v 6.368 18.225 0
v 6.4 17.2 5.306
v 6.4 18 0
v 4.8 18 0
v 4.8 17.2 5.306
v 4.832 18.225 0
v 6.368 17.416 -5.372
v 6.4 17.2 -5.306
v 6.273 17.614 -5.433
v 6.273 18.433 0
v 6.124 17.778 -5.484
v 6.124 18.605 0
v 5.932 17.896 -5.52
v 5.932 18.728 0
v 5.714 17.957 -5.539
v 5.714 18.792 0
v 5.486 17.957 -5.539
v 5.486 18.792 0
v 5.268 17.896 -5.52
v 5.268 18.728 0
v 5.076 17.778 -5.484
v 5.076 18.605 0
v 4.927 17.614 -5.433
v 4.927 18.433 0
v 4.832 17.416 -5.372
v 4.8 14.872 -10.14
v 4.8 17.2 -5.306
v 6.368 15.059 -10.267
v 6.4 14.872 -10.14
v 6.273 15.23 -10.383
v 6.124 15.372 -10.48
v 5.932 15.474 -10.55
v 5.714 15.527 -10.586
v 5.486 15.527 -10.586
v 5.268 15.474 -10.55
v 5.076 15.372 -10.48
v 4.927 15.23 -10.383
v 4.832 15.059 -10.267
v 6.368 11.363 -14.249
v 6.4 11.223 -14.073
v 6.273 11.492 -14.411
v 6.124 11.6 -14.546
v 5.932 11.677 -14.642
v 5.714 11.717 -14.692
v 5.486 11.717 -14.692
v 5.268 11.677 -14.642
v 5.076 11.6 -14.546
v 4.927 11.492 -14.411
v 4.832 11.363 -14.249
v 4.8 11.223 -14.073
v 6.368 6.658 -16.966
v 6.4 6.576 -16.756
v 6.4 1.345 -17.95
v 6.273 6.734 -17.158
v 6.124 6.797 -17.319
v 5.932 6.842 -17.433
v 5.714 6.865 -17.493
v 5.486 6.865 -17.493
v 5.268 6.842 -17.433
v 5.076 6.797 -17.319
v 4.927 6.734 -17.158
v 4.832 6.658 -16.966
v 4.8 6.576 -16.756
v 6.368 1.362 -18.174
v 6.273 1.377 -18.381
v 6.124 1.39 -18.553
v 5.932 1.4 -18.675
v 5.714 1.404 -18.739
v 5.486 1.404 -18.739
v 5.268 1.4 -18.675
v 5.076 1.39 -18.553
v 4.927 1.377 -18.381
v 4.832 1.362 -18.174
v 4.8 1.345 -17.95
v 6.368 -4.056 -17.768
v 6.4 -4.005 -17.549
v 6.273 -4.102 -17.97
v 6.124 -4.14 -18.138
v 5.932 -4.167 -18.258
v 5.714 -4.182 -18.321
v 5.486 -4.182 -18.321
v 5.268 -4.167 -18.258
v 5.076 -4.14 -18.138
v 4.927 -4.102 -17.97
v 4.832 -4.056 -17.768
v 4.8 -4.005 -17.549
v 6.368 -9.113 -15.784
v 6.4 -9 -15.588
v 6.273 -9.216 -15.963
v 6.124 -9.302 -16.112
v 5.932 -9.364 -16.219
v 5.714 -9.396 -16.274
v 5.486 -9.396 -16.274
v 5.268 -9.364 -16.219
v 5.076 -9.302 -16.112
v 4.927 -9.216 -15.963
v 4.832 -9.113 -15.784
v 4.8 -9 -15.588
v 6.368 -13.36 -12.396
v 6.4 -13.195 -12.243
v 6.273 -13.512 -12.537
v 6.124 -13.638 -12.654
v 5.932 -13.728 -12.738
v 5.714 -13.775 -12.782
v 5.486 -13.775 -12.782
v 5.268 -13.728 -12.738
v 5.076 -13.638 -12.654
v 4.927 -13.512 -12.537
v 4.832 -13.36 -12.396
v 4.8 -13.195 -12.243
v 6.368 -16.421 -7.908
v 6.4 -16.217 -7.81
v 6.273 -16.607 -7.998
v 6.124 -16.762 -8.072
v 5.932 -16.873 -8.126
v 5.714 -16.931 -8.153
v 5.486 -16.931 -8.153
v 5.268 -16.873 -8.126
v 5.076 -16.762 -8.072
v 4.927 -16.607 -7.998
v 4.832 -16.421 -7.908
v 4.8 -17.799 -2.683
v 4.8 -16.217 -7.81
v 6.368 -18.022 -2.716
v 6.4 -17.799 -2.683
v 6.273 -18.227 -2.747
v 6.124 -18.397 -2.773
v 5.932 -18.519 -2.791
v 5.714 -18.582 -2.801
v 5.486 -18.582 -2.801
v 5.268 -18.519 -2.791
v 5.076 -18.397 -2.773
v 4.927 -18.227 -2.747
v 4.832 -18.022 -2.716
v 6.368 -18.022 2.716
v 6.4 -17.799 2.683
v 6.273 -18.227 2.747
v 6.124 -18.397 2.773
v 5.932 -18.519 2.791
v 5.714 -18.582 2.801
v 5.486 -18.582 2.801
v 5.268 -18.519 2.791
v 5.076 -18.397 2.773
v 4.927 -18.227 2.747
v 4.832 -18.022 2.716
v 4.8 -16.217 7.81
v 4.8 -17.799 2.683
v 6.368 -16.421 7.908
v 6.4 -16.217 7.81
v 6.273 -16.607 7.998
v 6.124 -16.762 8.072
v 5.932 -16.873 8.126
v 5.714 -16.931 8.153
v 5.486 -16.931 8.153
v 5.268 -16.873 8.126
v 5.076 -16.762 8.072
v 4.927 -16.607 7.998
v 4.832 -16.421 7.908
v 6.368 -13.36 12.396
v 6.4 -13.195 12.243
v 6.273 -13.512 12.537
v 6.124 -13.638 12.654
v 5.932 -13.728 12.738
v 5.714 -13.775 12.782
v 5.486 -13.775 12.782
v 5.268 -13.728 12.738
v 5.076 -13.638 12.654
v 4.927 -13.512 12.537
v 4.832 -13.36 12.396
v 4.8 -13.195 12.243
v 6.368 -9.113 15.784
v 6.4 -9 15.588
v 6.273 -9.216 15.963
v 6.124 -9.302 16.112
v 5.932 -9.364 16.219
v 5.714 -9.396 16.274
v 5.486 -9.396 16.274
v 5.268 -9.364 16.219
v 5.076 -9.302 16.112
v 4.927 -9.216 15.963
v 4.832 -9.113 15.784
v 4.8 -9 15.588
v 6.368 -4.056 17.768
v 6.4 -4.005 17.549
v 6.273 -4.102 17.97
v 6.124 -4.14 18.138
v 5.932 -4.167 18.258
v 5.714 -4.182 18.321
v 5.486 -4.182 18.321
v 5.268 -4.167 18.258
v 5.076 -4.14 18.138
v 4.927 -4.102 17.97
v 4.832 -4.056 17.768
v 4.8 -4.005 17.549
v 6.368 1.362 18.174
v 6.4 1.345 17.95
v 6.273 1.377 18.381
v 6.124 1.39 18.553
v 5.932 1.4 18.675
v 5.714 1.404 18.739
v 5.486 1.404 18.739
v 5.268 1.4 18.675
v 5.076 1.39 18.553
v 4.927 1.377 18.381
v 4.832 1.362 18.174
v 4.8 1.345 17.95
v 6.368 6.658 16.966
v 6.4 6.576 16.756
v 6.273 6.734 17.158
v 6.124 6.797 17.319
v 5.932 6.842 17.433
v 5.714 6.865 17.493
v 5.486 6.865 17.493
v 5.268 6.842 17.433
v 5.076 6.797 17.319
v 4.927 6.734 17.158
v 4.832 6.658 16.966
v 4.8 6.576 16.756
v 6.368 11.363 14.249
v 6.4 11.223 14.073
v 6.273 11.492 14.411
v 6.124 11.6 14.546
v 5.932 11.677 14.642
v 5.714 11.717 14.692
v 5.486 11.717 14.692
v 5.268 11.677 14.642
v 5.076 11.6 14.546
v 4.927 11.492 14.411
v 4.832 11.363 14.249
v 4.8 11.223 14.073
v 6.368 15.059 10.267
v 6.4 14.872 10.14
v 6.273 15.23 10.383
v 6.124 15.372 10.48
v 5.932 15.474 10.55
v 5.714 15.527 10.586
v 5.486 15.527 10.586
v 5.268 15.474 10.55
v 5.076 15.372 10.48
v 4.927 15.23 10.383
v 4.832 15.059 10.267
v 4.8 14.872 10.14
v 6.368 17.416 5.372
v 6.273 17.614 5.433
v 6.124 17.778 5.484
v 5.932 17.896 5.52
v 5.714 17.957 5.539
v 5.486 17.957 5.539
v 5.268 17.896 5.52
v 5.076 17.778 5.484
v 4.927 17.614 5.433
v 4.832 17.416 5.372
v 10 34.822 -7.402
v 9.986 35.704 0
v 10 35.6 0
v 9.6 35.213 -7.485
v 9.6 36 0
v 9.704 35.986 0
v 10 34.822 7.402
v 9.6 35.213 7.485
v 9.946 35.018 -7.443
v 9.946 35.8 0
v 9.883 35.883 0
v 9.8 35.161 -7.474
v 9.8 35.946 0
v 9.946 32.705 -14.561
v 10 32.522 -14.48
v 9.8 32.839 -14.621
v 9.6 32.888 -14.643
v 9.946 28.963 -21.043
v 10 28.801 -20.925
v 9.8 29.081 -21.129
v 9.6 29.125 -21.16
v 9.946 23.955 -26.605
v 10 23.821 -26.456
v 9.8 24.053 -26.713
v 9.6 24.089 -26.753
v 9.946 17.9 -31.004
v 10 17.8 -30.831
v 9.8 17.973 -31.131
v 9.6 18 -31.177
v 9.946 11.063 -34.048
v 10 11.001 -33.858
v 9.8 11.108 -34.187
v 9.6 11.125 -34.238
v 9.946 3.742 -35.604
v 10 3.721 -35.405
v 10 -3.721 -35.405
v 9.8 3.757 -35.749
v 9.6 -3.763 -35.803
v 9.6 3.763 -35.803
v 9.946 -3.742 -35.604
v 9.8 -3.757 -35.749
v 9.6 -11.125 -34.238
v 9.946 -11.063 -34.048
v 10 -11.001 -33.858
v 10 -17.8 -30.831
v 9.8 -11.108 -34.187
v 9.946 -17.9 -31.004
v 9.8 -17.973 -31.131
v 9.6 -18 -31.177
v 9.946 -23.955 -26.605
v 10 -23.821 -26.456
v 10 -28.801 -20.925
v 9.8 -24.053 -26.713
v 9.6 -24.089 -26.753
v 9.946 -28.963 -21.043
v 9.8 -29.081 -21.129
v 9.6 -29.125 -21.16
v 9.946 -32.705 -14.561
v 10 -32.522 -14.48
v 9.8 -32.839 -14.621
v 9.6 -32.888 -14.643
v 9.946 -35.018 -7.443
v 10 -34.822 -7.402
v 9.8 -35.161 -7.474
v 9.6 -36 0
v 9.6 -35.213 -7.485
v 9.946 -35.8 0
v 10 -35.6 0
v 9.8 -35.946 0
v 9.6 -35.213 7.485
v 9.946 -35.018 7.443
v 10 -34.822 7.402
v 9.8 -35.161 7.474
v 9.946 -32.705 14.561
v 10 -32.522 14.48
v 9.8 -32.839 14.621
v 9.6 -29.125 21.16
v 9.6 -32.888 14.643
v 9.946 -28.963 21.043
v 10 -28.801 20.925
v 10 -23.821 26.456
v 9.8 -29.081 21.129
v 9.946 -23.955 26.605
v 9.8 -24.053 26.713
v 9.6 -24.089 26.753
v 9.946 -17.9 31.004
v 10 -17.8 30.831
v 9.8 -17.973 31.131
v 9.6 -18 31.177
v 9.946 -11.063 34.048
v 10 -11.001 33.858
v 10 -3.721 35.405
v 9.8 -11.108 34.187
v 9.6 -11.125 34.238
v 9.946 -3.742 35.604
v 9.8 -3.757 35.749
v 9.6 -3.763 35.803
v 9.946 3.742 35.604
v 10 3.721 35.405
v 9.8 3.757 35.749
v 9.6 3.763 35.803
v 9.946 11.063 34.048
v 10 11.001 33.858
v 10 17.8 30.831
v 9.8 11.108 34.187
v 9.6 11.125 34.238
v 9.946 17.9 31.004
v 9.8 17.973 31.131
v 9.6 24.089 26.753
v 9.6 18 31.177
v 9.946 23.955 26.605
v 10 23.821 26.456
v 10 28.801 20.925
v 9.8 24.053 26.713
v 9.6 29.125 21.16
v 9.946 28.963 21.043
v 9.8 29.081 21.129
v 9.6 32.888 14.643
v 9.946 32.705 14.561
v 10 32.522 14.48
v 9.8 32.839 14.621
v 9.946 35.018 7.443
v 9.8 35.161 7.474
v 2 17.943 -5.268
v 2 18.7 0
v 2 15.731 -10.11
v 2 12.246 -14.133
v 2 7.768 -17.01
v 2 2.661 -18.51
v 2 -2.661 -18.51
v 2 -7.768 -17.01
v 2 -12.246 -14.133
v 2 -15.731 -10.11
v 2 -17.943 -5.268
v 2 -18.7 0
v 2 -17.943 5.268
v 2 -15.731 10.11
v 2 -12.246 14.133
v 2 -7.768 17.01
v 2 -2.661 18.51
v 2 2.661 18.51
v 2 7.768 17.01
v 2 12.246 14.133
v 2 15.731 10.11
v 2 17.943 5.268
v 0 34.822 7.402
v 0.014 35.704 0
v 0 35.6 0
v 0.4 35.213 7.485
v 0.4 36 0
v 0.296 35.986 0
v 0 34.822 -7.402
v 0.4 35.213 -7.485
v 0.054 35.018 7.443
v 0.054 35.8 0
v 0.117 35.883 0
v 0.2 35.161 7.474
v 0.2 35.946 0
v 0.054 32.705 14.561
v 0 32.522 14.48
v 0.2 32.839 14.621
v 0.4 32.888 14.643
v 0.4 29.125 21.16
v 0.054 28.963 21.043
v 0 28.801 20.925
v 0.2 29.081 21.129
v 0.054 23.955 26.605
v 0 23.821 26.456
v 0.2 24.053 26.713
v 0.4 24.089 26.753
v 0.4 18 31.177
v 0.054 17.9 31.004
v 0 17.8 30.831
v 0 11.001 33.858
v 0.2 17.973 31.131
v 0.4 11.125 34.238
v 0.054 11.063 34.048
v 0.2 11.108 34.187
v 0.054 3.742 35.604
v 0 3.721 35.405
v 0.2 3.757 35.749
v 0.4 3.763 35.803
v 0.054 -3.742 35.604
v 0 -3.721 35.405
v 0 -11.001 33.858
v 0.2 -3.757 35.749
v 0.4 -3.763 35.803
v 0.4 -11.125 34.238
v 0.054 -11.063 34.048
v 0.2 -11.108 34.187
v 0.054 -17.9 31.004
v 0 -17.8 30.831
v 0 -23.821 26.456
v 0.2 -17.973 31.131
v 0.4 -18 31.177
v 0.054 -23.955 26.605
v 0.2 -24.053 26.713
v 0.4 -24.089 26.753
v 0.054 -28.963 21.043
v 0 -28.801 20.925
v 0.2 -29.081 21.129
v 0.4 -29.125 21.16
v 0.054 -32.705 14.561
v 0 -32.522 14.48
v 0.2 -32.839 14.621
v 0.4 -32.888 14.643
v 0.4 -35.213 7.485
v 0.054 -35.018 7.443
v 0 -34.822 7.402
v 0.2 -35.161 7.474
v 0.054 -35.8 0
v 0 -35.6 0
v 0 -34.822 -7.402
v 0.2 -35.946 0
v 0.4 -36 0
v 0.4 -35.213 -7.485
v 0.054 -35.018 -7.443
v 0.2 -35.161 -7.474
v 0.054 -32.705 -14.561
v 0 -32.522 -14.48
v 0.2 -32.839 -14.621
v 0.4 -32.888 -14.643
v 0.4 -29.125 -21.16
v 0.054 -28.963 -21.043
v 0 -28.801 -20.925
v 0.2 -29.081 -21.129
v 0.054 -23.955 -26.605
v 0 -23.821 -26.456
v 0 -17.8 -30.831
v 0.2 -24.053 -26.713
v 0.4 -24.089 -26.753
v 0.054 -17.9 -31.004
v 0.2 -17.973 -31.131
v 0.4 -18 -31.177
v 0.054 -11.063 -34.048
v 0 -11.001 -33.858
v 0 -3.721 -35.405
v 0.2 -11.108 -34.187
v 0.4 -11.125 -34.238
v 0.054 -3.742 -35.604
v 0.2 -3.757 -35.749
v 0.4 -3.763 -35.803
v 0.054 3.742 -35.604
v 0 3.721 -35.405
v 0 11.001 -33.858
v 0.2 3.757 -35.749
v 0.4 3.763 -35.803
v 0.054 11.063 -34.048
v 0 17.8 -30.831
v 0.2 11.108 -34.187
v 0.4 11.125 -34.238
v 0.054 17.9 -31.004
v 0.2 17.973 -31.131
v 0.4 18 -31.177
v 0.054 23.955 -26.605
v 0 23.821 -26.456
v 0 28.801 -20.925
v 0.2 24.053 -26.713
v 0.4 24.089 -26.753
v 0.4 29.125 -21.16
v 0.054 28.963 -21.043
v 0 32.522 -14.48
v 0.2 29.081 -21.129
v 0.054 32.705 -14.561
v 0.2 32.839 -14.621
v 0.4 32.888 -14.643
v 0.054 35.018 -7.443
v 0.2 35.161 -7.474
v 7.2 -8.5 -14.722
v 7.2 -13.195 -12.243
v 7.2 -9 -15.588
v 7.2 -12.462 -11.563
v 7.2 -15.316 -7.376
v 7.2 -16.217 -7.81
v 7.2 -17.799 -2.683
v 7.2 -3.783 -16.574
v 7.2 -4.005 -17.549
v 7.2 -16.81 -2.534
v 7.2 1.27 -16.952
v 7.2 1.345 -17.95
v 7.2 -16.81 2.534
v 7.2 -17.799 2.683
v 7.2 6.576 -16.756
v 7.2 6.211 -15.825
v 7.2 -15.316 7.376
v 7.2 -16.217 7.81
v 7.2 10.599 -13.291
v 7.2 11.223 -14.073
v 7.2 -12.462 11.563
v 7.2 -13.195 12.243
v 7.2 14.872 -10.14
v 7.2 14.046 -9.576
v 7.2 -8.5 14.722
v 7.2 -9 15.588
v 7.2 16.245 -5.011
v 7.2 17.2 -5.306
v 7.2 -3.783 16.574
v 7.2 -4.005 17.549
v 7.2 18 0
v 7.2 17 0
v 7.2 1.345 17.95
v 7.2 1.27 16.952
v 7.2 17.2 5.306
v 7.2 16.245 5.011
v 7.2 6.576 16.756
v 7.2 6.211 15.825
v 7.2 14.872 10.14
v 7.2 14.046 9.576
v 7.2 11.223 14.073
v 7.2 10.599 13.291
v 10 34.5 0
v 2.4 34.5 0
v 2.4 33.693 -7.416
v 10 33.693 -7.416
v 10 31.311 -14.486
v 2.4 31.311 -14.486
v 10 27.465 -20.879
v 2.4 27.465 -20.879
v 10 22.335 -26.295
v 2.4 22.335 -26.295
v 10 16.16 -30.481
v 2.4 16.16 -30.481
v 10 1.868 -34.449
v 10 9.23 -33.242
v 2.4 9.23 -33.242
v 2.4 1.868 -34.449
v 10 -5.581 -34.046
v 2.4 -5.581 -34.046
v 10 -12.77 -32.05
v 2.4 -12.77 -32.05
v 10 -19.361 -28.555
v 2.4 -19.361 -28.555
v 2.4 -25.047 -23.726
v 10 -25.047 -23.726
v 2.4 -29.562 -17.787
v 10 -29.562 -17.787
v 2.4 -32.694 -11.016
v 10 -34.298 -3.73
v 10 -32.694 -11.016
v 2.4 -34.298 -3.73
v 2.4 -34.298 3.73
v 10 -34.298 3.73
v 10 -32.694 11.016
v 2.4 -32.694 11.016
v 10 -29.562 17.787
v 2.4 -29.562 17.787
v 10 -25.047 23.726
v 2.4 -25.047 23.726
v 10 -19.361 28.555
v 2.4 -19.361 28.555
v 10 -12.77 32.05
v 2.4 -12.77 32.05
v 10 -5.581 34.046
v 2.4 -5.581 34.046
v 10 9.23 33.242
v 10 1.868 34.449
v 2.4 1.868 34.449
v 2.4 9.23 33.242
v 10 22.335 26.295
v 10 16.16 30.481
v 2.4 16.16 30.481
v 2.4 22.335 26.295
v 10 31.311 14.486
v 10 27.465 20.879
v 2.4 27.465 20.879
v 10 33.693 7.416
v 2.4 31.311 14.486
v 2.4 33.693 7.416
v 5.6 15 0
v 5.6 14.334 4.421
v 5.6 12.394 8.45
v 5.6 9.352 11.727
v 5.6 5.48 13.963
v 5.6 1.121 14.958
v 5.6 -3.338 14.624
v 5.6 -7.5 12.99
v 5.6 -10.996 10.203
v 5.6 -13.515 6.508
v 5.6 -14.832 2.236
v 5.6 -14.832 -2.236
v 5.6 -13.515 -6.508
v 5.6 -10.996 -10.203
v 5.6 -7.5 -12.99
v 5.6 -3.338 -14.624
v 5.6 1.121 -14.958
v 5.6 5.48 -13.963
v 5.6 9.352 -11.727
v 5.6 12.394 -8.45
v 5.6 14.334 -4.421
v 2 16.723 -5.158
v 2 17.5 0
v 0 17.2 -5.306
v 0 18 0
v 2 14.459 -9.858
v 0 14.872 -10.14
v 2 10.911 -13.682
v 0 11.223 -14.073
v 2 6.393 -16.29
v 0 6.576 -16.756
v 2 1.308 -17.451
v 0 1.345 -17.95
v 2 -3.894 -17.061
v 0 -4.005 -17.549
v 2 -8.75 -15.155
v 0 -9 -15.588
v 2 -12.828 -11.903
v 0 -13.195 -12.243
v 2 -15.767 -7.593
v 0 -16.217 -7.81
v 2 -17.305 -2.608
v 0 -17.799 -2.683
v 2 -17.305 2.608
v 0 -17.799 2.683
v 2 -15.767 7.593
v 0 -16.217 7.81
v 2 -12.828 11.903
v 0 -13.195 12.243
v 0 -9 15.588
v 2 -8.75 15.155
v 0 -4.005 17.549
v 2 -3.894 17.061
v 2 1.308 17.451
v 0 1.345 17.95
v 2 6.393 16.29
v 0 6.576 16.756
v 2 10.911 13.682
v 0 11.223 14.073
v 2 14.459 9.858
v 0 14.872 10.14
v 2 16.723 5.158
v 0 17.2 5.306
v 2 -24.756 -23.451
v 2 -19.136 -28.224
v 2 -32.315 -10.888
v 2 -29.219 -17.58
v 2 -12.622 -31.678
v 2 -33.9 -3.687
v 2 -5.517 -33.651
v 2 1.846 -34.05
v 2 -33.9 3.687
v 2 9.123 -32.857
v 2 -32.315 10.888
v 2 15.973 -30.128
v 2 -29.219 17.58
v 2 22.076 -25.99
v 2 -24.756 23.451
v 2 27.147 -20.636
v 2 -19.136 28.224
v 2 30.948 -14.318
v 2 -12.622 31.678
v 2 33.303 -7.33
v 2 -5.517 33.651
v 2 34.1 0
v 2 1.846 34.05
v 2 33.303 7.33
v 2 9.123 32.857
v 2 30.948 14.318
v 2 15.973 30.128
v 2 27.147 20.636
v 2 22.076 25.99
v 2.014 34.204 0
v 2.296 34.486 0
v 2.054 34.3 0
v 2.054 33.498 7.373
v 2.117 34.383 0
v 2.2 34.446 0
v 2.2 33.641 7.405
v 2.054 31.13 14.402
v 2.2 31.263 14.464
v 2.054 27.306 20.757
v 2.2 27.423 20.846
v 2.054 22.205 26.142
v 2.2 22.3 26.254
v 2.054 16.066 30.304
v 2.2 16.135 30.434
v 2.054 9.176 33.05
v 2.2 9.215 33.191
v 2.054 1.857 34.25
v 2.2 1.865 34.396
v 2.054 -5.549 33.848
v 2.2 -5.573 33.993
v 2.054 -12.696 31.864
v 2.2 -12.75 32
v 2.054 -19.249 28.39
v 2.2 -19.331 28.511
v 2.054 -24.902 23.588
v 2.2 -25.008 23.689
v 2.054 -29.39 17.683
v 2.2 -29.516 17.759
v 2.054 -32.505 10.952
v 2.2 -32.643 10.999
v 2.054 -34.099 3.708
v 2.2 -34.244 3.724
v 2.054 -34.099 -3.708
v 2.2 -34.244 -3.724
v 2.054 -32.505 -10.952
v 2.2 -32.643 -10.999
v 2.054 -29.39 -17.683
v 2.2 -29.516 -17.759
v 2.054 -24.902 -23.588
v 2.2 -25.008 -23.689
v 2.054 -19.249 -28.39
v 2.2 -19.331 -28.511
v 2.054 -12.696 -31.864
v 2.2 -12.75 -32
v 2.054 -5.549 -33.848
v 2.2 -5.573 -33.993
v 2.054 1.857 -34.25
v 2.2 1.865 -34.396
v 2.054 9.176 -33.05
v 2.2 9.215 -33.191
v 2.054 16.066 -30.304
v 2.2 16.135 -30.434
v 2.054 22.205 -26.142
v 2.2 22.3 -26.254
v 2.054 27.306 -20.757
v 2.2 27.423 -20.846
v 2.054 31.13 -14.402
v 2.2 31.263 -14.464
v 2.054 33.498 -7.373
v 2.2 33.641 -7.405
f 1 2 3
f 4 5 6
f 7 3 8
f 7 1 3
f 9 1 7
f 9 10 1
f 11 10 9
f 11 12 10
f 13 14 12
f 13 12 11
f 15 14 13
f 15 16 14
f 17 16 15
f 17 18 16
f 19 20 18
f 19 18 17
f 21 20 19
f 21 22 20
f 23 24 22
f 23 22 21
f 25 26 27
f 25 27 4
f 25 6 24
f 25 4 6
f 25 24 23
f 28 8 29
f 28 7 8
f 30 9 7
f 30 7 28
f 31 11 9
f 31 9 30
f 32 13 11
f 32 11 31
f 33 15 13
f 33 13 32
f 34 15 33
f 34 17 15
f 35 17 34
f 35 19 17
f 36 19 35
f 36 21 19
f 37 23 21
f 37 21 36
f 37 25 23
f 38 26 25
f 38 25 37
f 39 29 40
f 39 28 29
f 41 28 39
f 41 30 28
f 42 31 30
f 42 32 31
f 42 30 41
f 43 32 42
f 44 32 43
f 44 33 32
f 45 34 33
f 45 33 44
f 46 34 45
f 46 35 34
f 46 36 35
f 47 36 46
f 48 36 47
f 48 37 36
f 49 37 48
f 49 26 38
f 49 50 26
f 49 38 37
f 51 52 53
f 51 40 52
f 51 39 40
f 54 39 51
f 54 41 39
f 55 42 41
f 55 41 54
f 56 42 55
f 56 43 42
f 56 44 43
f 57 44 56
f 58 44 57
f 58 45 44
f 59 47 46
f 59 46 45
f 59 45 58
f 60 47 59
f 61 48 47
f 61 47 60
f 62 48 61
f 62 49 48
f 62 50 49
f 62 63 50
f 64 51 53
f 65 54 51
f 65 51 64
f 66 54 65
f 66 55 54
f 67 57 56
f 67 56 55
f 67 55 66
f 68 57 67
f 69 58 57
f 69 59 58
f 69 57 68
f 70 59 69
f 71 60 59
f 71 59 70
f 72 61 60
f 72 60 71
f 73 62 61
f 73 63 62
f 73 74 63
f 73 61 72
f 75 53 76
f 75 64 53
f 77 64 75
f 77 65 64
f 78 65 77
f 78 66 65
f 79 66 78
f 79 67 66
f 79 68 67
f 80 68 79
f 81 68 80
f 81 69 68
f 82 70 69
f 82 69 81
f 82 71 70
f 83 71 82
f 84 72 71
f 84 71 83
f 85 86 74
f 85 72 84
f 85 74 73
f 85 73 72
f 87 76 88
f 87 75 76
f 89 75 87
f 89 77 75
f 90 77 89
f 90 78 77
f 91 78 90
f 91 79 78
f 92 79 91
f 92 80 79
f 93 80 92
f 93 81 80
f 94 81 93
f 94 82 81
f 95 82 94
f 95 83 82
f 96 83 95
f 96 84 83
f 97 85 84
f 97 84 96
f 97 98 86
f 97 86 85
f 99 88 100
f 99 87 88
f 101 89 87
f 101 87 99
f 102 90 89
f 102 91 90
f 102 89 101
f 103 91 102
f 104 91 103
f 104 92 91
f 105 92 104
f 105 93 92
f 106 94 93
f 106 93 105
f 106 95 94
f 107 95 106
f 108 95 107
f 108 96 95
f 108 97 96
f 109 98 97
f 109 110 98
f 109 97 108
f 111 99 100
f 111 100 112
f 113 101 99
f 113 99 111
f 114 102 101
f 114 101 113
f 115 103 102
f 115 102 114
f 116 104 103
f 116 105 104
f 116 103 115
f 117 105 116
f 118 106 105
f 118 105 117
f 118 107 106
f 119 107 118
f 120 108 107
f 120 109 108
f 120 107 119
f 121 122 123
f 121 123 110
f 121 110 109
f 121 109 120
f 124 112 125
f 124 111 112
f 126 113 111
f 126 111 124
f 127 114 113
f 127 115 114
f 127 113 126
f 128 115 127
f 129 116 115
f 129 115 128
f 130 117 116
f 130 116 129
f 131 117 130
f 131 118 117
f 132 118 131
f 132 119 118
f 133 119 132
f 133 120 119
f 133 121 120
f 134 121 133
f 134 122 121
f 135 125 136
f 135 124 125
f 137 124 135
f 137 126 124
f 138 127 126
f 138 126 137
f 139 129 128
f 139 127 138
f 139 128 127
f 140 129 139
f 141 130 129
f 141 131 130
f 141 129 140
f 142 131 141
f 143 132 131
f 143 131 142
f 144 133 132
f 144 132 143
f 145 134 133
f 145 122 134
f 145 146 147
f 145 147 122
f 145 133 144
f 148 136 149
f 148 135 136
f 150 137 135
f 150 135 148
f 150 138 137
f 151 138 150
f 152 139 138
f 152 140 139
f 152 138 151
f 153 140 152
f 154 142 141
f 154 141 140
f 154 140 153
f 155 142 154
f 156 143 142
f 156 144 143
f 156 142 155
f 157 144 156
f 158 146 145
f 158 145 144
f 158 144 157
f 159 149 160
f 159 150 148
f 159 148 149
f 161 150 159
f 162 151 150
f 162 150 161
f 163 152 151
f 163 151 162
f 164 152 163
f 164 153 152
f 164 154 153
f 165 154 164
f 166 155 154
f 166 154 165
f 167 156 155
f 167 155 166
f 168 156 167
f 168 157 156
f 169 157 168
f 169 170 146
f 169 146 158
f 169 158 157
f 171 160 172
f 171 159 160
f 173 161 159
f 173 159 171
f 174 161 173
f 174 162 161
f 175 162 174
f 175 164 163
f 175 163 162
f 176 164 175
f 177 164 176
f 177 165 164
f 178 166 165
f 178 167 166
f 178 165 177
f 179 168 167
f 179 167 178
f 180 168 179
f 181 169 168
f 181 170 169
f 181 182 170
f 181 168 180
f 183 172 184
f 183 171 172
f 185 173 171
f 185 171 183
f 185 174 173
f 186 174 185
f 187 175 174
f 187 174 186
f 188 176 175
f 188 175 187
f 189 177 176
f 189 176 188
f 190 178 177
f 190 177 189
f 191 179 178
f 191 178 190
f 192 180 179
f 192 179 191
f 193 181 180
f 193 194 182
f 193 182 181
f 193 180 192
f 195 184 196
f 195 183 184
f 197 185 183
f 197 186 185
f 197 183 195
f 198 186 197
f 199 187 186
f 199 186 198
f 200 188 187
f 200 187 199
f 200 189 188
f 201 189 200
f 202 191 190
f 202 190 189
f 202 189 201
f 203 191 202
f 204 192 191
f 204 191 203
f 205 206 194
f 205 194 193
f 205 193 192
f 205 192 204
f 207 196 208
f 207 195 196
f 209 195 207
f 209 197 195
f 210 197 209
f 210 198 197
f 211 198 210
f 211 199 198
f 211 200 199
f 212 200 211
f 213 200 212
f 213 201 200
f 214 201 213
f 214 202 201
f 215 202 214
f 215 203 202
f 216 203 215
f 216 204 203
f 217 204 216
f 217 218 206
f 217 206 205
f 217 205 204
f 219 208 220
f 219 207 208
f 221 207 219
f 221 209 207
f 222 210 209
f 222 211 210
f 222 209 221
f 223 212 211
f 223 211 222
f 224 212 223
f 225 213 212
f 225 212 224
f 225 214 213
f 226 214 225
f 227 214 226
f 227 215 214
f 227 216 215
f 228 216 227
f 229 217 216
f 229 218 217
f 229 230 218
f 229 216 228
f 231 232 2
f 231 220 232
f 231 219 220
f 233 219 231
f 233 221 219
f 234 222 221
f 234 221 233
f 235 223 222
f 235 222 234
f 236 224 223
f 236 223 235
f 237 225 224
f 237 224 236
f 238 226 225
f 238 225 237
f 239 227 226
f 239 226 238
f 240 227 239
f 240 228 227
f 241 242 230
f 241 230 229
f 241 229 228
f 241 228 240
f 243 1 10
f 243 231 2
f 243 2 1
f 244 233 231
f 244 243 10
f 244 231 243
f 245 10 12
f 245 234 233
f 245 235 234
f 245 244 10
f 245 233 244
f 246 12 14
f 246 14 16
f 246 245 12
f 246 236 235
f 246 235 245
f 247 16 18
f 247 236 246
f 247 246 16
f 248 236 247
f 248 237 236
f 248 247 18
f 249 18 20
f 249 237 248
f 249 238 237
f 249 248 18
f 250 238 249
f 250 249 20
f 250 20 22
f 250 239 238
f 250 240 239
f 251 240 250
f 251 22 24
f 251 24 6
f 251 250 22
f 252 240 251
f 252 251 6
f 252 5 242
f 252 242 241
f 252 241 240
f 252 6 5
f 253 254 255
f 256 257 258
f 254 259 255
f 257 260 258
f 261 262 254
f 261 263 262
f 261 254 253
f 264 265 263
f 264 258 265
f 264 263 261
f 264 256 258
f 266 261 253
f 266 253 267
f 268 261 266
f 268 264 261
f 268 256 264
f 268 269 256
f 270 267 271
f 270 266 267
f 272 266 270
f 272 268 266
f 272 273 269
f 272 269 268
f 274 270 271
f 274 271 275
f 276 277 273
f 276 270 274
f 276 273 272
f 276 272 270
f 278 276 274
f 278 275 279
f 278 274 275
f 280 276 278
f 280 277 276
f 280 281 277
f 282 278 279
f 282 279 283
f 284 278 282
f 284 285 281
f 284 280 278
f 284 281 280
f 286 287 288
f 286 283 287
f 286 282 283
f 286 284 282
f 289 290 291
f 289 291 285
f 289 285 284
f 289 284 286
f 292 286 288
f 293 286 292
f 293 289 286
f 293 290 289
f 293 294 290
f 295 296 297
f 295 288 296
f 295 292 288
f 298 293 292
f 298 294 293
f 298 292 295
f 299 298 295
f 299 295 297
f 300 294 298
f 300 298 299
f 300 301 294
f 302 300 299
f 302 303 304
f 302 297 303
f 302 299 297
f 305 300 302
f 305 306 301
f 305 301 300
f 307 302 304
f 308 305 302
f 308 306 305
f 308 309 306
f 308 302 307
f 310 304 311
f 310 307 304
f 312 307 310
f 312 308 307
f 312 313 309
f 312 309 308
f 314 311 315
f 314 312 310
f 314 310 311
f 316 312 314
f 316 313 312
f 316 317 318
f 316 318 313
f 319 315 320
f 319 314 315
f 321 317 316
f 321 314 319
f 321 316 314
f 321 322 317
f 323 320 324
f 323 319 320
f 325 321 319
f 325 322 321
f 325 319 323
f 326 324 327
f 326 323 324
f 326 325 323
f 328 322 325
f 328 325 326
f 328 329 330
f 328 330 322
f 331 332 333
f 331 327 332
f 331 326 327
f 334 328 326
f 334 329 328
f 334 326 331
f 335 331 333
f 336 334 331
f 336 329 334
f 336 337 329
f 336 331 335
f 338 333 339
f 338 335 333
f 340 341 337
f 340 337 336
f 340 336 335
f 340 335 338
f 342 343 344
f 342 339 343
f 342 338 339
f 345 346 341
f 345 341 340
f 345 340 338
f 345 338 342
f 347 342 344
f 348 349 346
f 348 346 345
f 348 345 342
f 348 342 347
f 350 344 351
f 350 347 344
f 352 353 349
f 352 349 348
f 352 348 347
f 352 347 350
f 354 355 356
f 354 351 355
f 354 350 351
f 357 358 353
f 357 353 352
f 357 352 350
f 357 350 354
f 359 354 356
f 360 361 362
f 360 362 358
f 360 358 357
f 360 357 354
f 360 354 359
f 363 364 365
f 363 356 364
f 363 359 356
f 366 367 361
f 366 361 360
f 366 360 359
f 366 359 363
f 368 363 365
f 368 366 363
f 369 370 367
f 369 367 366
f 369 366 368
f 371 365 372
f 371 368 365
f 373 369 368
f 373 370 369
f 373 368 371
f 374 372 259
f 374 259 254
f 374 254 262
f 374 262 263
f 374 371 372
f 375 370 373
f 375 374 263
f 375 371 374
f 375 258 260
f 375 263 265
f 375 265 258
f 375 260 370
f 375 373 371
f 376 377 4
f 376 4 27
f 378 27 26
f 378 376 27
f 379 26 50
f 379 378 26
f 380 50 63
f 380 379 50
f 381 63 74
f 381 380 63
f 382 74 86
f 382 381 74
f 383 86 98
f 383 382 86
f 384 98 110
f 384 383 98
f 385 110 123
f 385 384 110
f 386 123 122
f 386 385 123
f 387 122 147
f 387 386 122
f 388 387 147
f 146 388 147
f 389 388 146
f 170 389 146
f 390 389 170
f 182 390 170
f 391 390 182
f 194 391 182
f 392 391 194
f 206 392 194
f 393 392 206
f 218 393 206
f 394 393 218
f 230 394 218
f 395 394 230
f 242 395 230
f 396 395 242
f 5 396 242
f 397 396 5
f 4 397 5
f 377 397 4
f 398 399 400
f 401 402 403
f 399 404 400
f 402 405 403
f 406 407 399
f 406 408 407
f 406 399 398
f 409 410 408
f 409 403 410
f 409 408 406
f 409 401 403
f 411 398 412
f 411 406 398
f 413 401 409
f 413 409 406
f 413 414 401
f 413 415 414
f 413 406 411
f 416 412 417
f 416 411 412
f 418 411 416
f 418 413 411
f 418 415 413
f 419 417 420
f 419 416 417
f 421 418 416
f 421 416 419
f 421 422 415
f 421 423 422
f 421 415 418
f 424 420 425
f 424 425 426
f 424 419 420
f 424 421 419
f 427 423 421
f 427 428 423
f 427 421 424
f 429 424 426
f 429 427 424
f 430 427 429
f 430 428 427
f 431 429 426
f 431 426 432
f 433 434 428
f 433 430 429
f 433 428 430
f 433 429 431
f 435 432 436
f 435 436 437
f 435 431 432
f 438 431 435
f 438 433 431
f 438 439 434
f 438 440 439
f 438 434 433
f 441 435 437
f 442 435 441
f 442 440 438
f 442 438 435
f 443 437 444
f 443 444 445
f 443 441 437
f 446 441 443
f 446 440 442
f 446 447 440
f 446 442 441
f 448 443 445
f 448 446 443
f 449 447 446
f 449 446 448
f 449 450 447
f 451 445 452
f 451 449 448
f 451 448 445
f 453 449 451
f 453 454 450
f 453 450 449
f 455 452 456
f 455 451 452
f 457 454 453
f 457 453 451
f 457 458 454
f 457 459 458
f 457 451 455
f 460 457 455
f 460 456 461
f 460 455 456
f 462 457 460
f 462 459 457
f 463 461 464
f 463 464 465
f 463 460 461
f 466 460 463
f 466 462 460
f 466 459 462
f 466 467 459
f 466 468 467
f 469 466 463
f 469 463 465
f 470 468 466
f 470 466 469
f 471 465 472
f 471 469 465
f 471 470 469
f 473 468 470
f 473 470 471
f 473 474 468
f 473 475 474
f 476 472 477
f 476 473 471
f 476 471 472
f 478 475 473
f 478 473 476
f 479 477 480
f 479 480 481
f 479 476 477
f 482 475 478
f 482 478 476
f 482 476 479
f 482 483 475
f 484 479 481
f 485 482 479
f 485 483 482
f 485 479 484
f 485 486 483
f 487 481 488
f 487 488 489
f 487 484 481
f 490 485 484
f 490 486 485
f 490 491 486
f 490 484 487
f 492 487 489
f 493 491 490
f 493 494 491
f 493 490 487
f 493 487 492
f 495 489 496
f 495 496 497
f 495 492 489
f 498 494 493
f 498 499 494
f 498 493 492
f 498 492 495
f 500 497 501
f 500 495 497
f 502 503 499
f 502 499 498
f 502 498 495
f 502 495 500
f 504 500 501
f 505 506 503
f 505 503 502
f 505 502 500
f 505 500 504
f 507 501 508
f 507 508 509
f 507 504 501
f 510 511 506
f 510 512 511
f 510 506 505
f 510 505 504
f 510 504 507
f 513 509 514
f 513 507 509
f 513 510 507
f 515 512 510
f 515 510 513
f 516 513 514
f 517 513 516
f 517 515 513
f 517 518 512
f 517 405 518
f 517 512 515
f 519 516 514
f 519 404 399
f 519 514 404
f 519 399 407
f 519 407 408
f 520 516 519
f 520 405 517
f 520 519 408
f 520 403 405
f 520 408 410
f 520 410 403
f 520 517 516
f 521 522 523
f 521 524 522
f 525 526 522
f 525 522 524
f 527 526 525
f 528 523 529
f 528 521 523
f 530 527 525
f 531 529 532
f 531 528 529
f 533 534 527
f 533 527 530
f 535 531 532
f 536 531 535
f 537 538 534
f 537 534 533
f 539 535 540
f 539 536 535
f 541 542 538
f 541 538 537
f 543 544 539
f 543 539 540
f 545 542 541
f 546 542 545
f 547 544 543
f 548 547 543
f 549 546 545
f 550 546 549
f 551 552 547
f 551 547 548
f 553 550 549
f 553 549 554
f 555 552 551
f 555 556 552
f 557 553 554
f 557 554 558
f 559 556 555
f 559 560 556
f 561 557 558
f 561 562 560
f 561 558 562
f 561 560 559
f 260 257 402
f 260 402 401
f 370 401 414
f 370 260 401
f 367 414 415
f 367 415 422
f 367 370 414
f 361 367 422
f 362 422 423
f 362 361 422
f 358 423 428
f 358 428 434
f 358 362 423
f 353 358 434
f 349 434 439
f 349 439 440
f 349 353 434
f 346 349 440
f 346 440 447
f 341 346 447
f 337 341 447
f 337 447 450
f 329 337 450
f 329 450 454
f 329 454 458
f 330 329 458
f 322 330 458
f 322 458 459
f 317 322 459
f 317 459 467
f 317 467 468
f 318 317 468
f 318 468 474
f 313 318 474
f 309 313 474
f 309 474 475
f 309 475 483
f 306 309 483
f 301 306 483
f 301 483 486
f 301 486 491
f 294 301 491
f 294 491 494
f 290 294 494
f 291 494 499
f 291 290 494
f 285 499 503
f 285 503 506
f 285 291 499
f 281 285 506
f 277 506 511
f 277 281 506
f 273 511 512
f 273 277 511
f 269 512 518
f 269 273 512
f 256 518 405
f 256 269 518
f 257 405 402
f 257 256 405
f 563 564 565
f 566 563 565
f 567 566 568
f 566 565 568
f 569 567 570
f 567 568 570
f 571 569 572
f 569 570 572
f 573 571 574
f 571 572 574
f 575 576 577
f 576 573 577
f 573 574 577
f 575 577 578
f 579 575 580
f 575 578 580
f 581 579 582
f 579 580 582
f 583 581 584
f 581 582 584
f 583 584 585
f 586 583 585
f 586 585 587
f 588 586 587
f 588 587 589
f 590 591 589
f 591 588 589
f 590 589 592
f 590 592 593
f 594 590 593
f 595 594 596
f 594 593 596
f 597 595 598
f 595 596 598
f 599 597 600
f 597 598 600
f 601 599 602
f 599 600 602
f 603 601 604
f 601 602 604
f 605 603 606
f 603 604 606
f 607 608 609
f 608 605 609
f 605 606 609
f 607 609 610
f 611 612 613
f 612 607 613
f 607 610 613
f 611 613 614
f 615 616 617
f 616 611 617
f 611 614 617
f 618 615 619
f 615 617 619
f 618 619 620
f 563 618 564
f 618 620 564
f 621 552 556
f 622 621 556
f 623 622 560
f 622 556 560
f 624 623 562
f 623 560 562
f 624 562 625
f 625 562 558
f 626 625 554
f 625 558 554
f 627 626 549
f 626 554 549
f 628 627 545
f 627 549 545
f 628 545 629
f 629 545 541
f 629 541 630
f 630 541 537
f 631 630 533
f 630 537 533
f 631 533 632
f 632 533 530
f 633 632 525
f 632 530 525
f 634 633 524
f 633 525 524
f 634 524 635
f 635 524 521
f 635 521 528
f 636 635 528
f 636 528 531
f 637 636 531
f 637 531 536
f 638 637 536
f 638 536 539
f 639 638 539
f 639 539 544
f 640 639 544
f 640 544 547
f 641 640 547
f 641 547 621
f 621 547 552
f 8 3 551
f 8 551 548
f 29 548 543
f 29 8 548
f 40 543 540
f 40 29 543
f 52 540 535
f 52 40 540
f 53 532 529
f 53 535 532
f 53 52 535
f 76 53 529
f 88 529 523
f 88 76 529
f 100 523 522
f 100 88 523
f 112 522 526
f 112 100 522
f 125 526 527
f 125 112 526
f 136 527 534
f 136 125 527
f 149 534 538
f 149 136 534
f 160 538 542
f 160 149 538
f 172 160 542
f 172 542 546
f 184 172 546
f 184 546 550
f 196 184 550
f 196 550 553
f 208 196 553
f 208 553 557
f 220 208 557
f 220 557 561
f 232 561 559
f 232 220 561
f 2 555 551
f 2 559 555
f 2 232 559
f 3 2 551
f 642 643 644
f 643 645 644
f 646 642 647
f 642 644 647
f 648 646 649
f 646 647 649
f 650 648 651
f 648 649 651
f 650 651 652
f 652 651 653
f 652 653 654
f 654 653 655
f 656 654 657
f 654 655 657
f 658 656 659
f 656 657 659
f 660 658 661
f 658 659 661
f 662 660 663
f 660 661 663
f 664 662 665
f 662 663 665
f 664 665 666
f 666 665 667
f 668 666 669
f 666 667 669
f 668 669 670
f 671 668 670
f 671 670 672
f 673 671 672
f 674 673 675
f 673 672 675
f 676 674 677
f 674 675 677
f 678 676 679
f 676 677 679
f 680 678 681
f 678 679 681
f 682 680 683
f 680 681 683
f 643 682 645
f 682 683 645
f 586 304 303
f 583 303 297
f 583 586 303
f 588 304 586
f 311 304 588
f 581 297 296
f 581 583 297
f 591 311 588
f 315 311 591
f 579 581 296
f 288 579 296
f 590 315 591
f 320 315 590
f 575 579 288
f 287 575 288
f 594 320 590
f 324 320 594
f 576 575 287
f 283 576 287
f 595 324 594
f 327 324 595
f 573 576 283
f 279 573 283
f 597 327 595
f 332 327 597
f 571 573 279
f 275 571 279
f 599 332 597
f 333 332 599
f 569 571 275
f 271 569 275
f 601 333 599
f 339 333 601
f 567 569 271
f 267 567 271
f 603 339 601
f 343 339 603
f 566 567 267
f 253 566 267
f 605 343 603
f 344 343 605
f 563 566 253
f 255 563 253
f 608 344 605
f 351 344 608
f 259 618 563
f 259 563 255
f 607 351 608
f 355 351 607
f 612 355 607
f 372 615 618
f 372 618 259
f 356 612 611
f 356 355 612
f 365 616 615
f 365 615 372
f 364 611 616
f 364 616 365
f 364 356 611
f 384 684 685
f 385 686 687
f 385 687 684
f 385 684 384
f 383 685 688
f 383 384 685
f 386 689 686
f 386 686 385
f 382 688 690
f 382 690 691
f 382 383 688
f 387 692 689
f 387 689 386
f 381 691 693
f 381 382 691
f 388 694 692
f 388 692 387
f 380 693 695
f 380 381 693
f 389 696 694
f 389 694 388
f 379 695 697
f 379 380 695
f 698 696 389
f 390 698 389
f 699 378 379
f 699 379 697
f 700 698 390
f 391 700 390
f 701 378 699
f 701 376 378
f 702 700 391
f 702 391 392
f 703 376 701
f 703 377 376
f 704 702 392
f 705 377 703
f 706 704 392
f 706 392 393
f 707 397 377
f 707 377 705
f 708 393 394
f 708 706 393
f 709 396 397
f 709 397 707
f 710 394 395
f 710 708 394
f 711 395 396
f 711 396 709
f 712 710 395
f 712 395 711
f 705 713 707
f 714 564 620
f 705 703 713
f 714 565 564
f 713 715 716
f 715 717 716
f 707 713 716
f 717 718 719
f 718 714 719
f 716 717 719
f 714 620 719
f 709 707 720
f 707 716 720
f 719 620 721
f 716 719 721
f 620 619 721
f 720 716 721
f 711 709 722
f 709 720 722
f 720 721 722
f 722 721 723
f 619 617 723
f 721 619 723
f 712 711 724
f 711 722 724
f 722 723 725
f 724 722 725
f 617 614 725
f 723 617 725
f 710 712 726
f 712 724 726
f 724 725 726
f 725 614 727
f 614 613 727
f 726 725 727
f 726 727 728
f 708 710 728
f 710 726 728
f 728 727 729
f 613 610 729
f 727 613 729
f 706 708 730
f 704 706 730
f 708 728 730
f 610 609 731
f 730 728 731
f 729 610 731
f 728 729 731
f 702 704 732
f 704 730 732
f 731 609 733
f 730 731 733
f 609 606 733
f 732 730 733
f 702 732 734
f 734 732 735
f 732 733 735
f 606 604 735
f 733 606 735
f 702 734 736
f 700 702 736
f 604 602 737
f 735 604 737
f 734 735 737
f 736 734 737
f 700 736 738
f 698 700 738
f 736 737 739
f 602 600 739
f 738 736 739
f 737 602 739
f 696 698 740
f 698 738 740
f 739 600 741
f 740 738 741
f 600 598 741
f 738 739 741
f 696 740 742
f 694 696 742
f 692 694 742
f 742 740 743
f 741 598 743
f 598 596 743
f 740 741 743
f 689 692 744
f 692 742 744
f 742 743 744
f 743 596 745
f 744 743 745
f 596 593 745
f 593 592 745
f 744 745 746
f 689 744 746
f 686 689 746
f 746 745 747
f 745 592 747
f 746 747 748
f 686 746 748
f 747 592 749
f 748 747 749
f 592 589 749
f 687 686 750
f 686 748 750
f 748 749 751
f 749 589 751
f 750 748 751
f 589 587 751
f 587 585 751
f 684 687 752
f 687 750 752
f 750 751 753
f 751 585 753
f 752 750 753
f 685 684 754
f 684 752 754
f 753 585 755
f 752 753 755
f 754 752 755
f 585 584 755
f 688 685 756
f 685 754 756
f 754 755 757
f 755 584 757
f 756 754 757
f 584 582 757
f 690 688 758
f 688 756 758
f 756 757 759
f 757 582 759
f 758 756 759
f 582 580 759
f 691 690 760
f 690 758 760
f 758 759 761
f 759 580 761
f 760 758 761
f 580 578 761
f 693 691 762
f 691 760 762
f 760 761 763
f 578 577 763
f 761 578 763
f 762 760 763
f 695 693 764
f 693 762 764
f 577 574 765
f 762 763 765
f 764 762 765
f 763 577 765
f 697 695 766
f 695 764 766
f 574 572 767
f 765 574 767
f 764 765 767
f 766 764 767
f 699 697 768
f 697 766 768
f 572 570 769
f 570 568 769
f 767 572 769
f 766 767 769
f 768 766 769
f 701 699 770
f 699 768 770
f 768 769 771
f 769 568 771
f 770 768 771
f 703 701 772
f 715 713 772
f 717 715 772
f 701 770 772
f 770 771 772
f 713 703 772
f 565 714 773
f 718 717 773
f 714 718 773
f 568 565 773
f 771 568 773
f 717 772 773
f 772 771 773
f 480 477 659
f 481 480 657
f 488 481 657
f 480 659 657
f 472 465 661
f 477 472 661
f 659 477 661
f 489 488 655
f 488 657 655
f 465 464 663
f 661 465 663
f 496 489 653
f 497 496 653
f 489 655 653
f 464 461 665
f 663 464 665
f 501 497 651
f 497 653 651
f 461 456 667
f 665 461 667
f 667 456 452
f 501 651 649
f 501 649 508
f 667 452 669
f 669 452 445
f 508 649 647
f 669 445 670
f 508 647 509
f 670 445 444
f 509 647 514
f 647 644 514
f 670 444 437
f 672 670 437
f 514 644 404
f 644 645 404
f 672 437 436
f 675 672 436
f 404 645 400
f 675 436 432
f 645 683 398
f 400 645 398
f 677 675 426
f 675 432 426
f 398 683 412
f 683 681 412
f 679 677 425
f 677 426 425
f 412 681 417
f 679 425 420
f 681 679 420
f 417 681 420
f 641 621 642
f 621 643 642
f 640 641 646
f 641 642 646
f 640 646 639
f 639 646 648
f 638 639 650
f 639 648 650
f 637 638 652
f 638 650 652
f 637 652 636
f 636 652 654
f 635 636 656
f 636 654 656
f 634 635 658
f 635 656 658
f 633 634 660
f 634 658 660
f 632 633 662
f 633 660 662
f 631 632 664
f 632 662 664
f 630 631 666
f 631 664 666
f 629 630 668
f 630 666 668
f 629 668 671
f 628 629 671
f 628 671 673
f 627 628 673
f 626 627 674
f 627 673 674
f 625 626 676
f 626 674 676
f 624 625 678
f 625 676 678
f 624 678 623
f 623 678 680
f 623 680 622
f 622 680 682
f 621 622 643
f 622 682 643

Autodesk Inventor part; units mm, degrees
ref_plane "YZ Plane" through (0, 0, 0) normal (1, 0, 0) x (0, 1, 0)
ref_plane "XZ Plane" through (0, 0, 0) normal (0, 1, 0) x (-1, 0, 0)
ref_plane "XY Plane" through (0, 0, 0) normal (0, 0, 1) x (1, 0, 0)
sketch "Эскиз1" plane through (0, 0, 0) normal (0, 0, 1) x (1, 0, 0)
  circle A0 centre (5.6, 18) radius 0.52
  circle A1 centre (5.6, 18) radius 0.8
  line L0 (7.2, 17) -> (7.2, 18)
  line L1 (0, 36) -> (10, 36)
  line L2 (10, 36) -> (10, 34.5)
  line L3 (10, 34.5) -> (2, 34.5)
  line L4 (0, 0) -> (9.5856, 0)
  line L5 (0, 36) -> (0, 18)
  line L6 (0, 18) -> (2, 17.5)
  line L7 (2, 17.5) -> (5.6, 15)
  line L8 (5.6, 15) -> (7.2, 17)
  line L9 (5.6, 15) -> (0, 15) construction
  line L10 (0, 43.2) -> (0, -7.2) projected
  line L11 (-2, 0) -> (12, 0) projected
  line L12 (4.8, 18) -> (2, 18.7)
  line L13 (2, 18.7) -> (2, 34.5)
  line L14 (7.2, 18) -> (6.4, 18)
  dimension "d0" = 72
  dimension "d1" = 34
  dimension "d2" = 1.5
  dimension "d3" = 1.04
  dimension "d4" = 1.6
  dimension "d5" = 30
  dimension "d6" = 35
  dimension "d7" = 36
  dimension "d8" = 5.6
  dimension "d9" = 7.2
  dimension "d10" = 10
  dimension "d12" = 2
revolve "Базовый элемент" add sketch "Эскиз1" angle 360 about axis through (0, 0, 0) along (1, 0, 0) contours L14 L0 L8 L7 L6 L5 L1 L2 L3 L13 L12 A1
revolve "Пружинные1" add sketch "Эскиз1" angle 360 about axis through (0, 0, 0) along (1, 0, 0) contours A0 | A1
fillet "Сопряжение1" radius 0.4 3 edges at (10, -36, 0) (2, -34.5, 0) (0, -36, 0)
equation "\"d0\" = SD2"
equation "\"d3\" = SPDI"
equation "\"d4\" = SPDA"
equation "\"d8\" = SPDST"
equation "\"d9\" = SDI"
equation "\"d12\" = SD"
equation "\"d11\" = RR"
equation "\"SD2\" = 72"
equation "\"SWDT\" = 8"
equation "\"RR\" = 0.4"
equation "\"SD\" = 2"
equation "\"SPDA\" = 1.6"
equation "\"SPDI\" = 1.04"
equation "\"TKDM\" = 53"
equation "\"HLDM\" = 54.8"
equation "\"ABDM\" = 52"
equation "\"SDI\" = 7.2"
equation "\"SPDST\" = 5.6"
equation "\"LAB\" = 0.4"
properties part number "Манжет 1-50x72x8 ГОСТ 8752-79" material "Резина"
